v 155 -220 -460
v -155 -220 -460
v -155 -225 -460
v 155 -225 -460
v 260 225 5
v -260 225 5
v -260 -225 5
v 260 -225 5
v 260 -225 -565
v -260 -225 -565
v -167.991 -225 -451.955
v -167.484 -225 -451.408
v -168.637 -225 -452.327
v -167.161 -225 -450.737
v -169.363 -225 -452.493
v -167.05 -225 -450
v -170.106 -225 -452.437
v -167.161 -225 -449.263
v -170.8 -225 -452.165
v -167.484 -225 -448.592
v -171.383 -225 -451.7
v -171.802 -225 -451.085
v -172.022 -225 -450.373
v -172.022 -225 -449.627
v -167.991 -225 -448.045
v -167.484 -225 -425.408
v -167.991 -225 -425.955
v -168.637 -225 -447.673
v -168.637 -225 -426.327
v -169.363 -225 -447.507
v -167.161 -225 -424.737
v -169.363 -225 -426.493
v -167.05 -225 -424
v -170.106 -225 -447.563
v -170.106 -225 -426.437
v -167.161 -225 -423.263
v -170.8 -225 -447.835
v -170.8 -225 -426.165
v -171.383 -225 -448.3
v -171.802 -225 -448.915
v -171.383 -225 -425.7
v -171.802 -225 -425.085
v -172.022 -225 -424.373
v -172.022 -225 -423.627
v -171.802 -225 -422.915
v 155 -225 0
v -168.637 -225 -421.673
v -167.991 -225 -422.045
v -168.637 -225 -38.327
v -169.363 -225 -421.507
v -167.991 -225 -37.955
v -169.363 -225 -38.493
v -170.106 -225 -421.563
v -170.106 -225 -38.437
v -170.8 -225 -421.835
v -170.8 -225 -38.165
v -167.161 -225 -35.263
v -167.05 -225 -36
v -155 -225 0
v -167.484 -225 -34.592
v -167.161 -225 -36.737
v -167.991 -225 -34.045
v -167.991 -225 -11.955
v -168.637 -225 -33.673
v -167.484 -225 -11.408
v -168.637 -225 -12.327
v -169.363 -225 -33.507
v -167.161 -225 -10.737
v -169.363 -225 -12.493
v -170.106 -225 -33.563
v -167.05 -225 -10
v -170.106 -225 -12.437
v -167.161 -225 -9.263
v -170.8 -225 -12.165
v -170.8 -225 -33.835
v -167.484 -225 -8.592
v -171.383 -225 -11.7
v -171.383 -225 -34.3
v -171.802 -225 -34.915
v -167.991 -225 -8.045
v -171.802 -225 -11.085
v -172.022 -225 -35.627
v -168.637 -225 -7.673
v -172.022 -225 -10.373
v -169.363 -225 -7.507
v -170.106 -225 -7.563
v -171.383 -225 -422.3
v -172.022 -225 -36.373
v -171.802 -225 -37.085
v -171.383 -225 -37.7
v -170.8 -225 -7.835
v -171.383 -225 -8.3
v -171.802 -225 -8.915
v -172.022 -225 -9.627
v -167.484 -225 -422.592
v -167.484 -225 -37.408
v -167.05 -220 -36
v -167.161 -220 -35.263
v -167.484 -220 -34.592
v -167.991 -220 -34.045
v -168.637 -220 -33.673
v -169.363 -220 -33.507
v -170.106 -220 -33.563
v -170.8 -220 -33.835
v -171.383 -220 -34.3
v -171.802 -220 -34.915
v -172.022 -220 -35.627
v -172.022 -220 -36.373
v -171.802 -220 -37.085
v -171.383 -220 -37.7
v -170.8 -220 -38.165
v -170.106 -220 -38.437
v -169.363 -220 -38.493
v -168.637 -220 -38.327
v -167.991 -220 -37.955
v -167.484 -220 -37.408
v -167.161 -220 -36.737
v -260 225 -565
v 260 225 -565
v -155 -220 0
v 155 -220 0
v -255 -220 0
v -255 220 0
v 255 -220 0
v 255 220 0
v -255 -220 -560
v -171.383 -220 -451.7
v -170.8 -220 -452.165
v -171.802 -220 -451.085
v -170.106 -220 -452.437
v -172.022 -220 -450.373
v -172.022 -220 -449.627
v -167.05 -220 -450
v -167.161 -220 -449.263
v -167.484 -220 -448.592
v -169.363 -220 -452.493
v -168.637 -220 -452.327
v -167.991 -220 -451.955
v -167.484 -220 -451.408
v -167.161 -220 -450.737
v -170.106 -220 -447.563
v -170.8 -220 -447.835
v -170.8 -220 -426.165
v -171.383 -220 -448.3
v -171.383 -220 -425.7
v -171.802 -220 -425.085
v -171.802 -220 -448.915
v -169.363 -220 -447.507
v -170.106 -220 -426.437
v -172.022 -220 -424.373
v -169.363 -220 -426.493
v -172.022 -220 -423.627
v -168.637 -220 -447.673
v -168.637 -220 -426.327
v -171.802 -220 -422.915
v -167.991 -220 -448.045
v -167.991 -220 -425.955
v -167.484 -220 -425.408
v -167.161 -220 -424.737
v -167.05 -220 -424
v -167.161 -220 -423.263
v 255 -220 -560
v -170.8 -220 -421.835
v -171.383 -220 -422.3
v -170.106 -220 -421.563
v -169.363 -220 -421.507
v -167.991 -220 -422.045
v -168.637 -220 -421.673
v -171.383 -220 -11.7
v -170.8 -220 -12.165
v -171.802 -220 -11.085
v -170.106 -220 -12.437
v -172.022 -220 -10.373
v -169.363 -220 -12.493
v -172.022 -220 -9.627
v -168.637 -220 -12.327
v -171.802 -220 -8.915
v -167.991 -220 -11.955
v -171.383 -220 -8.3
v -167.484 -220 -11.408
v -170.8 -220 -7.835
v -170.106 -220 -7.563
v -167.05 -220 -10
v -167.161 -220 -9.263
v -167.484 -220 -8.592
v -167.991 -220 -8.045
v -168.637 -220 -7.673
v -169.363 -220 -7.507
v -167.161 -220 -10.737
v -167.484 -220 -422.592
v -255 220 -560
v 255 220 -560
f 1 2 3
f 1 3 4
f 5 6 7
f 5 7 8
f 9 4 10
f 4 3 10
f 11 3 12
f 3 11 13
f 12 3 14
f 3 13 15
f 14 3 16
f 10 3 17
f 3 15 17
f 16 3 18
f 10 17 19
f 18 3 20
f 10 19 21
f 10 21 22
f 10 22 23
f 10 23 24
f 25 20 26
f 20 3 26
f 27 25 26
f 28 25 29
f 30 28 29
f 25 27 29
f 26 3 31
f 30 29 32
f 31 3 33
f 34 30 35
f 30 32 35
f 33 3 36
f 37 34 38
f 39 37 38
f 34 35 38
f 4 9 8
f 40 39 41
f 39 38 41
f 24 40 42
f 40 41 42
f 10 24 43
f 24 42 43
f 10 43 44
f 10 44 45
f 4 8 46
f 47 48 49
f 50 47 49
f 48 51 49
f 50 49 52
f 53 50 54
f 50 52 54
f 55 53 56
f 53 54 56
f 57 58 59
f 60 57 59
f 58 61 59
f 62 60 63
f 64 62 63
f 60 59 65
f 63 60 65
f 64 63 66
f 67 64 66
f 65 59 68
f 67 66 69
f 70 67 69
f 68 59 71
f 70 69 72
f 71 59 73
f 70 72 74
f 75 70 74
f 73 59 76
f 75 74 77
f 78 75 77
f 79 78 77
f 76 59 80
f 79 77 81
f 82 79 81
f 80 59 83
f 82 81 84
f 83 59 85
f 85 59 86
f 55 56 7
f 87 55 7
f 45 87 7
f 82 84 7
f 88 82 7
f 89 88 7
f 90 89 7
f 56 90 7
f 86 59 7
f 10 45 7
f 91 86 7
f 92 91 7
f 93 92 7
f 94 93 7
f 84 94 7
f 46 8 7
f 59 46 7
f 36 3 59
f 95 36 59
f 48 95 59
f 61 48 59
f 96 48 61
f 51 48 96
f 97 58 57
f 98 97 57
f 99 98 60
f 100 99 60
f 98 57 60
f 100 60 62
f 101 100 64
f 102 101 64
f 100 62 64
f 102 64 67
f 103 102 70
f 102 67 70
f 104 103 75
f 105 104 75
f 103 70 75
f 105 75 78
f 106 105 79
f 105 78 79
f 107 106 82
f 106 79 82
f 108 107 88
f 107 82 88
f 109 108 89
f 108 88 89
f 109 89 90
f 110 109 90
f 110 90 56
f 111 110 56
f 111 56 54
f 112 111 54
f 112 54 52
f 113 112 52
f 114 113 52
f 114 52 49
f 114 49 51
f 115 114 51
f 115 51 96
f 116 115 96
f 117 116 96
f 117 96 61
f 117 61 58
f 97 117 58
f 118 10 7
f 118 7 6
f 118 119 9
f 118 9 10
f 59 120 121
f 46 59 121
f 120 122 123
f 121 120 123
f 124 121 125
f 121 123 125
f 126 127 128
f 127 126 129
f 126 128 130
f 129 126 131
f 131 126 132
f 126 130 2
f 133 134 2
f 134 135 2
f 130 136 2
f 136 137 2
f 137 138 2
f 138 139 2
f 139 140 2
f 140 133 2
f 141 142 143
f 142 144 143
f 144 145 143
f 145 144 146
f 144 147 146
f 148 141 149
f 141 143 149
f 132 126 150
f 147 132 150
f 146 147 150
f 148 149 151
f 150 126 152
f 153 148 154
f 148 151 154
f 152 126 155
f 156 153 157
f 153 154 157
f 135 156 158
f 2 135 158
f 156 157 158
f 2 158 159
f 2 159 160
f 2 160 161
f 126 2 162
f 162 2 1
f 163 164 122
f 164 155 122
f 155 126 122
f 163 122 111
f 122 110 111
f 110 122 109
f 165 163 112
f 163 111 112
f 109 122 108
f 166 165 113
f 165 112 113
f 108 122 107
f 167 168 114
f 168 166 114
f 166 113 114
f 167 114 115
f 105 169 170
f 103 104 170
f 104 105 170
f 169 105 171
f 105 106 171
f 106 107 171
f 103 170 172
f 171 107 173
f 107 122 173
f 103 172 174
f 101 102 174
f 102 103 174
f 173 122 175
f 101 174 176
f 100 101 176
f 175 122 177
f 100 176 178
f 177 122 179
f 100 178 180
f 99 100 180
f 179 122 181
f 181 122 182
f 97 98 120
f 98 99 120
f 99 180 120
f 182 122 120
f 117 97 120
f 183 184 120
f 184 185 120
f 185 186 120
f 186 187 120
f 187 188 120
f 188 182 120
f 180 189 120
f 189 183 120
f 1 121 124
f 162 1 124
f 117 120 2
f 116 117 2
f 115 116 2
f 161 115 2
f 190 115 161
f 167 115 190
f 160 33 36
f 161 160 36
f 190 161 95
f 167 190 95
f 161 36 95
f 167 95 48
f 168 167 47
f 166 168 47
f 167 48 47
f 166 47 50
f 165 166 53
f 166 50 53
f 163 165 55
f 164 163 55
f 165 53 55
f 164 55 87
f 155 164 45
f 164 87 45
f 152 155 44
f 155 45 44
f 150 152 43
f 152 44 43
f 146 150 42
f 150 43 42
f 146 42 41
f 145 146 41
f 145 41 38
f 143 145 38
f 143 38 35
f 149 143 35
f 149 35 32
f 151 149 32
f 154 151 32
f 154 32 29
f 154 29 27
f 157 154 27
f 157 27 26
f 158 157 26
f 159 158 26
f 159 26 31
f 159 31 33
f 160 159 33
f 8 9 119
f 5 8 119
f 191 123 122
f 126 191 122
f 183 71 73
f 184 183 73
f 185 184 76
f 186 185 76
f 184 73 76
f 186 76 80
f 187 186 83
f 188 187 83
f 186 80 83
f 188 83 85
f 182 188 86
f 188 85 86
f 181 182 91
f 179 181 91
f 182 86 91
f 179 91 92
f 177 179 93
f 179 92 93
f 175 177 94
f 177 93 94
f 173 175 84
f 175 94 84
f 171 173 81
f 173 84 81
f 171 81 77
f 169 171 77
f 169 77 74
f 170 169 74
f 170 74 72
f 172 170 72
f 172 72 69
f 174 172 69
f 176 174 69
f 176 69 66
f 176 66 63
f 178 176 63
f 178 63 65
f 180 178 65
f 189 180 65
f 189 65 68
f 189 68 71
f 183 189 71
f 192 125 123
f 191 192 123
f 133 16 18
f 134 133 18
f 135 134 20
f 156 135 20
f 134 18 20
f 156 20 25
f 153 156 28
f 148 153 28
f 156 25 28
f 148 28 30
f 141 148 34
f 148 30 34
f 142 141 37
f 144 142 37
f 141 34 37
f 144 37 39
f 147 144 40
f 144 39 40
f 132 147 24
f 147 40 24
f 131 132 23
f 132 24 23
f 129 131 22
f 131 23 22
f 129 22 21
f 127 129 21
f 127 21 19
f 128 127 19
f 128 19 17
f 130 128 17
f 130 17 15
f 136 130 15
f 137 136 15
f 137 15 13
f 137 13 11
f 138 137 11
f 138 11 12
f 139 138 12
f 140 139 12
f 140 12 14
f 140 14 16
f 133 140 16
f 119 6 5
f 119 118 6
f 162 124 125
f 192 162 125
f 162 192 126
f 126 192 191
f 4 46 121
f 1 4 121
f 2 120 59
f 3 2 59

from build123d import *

# Parameters (mm, degrees)
SKETCH1_W           = 520
SKETCH1_H           = 450
BOSS_EXTRUDE1_DEPTH = 5
BOSS_EXTRUDE3_DEPTH = 560
SKETCH4_W           = 520
SKETCH4_H           = 450
BOSS_EXTRUDE4_DEPTH = 5
SKETCH5_W           = 520
SKETCH5_H           = 450
SKETCH5_W_2         = 510
SKETCH5_H_2         = 440
BOSS_EXTRUDE5_DEPTH = 100
SKETCH6_R           = 2.5
CUT_EXTRUDE1_DEPTH  = 10


with BuildPart() as part:
    # Sketch1 → Boss-Extrude1 (new body)
    with BuildSketch(Plane.XY):
        Rectangle(SKETCH1_W, SKETCH1_H)
    extrude(amount=BOSS_EXTRUDE1_DEPTH)

    # Sketch3 → Boss-Extrude3 (add)
    with BuildSketch(Plane(origin=(0, 0, 0), x_dir=(-1, 0, 0), z_dir=(0, 0, -1))):
        Polygon((260, 225), (-260, 225), (-260, -225), (-155, -225), (-155, -220), (-255, -220), (-255, 220), (255, 220), (255, -220), (155, -220), (155, -225), (260, -225), align=None)
    extrude(amount=BOSS_EXTRUDE3_DEPTH)

    # Sketch4 → Boss-Extrude4 (add)
    with BuildSketch(Plane(origin=(0, 0, -560), x_dir=(-1, 0, 0), z_dir=(0, 0, -1))):
        Rectangle(SKETCH4_W, SKETCH4_H)
    extrude(amount=BOSS_EXTRUDE4_DEPTH)

    # Sketch5 → Boss-Extrude5 (add)
    with BuildSketch(Plane.XY.offset(-560)):
        Rectangle(SKETCH5_W, SKETCH5_H)
        Rectangle(SKETCH5_W_2, SKETCH5_H_2, mode=Mode.SUBTRACT)
    extrude(amount=BOSS_EXTRUDE5_DEPTH)

    # Sketch6 → Cut-Extrude1 (cut)
    with BuildSketch(Plane.XZ.offset(225)):
        with Locations((-169.55, -10)):
            Circle(SKETCH6_R)
        with Locations((-169.55, -36)):
            Circle(SKETCH6_R)
        with Locations((-169.55, -450)):
            Circle(SKETCH6_R)
        with Locations((-169.55, -424)):
            Circle(SKETCH6_R)
    extrude(amount=-CUT_EXTRUDE1_DEPTH, mode=Mode.SUBTRACT)


solid = part.part
